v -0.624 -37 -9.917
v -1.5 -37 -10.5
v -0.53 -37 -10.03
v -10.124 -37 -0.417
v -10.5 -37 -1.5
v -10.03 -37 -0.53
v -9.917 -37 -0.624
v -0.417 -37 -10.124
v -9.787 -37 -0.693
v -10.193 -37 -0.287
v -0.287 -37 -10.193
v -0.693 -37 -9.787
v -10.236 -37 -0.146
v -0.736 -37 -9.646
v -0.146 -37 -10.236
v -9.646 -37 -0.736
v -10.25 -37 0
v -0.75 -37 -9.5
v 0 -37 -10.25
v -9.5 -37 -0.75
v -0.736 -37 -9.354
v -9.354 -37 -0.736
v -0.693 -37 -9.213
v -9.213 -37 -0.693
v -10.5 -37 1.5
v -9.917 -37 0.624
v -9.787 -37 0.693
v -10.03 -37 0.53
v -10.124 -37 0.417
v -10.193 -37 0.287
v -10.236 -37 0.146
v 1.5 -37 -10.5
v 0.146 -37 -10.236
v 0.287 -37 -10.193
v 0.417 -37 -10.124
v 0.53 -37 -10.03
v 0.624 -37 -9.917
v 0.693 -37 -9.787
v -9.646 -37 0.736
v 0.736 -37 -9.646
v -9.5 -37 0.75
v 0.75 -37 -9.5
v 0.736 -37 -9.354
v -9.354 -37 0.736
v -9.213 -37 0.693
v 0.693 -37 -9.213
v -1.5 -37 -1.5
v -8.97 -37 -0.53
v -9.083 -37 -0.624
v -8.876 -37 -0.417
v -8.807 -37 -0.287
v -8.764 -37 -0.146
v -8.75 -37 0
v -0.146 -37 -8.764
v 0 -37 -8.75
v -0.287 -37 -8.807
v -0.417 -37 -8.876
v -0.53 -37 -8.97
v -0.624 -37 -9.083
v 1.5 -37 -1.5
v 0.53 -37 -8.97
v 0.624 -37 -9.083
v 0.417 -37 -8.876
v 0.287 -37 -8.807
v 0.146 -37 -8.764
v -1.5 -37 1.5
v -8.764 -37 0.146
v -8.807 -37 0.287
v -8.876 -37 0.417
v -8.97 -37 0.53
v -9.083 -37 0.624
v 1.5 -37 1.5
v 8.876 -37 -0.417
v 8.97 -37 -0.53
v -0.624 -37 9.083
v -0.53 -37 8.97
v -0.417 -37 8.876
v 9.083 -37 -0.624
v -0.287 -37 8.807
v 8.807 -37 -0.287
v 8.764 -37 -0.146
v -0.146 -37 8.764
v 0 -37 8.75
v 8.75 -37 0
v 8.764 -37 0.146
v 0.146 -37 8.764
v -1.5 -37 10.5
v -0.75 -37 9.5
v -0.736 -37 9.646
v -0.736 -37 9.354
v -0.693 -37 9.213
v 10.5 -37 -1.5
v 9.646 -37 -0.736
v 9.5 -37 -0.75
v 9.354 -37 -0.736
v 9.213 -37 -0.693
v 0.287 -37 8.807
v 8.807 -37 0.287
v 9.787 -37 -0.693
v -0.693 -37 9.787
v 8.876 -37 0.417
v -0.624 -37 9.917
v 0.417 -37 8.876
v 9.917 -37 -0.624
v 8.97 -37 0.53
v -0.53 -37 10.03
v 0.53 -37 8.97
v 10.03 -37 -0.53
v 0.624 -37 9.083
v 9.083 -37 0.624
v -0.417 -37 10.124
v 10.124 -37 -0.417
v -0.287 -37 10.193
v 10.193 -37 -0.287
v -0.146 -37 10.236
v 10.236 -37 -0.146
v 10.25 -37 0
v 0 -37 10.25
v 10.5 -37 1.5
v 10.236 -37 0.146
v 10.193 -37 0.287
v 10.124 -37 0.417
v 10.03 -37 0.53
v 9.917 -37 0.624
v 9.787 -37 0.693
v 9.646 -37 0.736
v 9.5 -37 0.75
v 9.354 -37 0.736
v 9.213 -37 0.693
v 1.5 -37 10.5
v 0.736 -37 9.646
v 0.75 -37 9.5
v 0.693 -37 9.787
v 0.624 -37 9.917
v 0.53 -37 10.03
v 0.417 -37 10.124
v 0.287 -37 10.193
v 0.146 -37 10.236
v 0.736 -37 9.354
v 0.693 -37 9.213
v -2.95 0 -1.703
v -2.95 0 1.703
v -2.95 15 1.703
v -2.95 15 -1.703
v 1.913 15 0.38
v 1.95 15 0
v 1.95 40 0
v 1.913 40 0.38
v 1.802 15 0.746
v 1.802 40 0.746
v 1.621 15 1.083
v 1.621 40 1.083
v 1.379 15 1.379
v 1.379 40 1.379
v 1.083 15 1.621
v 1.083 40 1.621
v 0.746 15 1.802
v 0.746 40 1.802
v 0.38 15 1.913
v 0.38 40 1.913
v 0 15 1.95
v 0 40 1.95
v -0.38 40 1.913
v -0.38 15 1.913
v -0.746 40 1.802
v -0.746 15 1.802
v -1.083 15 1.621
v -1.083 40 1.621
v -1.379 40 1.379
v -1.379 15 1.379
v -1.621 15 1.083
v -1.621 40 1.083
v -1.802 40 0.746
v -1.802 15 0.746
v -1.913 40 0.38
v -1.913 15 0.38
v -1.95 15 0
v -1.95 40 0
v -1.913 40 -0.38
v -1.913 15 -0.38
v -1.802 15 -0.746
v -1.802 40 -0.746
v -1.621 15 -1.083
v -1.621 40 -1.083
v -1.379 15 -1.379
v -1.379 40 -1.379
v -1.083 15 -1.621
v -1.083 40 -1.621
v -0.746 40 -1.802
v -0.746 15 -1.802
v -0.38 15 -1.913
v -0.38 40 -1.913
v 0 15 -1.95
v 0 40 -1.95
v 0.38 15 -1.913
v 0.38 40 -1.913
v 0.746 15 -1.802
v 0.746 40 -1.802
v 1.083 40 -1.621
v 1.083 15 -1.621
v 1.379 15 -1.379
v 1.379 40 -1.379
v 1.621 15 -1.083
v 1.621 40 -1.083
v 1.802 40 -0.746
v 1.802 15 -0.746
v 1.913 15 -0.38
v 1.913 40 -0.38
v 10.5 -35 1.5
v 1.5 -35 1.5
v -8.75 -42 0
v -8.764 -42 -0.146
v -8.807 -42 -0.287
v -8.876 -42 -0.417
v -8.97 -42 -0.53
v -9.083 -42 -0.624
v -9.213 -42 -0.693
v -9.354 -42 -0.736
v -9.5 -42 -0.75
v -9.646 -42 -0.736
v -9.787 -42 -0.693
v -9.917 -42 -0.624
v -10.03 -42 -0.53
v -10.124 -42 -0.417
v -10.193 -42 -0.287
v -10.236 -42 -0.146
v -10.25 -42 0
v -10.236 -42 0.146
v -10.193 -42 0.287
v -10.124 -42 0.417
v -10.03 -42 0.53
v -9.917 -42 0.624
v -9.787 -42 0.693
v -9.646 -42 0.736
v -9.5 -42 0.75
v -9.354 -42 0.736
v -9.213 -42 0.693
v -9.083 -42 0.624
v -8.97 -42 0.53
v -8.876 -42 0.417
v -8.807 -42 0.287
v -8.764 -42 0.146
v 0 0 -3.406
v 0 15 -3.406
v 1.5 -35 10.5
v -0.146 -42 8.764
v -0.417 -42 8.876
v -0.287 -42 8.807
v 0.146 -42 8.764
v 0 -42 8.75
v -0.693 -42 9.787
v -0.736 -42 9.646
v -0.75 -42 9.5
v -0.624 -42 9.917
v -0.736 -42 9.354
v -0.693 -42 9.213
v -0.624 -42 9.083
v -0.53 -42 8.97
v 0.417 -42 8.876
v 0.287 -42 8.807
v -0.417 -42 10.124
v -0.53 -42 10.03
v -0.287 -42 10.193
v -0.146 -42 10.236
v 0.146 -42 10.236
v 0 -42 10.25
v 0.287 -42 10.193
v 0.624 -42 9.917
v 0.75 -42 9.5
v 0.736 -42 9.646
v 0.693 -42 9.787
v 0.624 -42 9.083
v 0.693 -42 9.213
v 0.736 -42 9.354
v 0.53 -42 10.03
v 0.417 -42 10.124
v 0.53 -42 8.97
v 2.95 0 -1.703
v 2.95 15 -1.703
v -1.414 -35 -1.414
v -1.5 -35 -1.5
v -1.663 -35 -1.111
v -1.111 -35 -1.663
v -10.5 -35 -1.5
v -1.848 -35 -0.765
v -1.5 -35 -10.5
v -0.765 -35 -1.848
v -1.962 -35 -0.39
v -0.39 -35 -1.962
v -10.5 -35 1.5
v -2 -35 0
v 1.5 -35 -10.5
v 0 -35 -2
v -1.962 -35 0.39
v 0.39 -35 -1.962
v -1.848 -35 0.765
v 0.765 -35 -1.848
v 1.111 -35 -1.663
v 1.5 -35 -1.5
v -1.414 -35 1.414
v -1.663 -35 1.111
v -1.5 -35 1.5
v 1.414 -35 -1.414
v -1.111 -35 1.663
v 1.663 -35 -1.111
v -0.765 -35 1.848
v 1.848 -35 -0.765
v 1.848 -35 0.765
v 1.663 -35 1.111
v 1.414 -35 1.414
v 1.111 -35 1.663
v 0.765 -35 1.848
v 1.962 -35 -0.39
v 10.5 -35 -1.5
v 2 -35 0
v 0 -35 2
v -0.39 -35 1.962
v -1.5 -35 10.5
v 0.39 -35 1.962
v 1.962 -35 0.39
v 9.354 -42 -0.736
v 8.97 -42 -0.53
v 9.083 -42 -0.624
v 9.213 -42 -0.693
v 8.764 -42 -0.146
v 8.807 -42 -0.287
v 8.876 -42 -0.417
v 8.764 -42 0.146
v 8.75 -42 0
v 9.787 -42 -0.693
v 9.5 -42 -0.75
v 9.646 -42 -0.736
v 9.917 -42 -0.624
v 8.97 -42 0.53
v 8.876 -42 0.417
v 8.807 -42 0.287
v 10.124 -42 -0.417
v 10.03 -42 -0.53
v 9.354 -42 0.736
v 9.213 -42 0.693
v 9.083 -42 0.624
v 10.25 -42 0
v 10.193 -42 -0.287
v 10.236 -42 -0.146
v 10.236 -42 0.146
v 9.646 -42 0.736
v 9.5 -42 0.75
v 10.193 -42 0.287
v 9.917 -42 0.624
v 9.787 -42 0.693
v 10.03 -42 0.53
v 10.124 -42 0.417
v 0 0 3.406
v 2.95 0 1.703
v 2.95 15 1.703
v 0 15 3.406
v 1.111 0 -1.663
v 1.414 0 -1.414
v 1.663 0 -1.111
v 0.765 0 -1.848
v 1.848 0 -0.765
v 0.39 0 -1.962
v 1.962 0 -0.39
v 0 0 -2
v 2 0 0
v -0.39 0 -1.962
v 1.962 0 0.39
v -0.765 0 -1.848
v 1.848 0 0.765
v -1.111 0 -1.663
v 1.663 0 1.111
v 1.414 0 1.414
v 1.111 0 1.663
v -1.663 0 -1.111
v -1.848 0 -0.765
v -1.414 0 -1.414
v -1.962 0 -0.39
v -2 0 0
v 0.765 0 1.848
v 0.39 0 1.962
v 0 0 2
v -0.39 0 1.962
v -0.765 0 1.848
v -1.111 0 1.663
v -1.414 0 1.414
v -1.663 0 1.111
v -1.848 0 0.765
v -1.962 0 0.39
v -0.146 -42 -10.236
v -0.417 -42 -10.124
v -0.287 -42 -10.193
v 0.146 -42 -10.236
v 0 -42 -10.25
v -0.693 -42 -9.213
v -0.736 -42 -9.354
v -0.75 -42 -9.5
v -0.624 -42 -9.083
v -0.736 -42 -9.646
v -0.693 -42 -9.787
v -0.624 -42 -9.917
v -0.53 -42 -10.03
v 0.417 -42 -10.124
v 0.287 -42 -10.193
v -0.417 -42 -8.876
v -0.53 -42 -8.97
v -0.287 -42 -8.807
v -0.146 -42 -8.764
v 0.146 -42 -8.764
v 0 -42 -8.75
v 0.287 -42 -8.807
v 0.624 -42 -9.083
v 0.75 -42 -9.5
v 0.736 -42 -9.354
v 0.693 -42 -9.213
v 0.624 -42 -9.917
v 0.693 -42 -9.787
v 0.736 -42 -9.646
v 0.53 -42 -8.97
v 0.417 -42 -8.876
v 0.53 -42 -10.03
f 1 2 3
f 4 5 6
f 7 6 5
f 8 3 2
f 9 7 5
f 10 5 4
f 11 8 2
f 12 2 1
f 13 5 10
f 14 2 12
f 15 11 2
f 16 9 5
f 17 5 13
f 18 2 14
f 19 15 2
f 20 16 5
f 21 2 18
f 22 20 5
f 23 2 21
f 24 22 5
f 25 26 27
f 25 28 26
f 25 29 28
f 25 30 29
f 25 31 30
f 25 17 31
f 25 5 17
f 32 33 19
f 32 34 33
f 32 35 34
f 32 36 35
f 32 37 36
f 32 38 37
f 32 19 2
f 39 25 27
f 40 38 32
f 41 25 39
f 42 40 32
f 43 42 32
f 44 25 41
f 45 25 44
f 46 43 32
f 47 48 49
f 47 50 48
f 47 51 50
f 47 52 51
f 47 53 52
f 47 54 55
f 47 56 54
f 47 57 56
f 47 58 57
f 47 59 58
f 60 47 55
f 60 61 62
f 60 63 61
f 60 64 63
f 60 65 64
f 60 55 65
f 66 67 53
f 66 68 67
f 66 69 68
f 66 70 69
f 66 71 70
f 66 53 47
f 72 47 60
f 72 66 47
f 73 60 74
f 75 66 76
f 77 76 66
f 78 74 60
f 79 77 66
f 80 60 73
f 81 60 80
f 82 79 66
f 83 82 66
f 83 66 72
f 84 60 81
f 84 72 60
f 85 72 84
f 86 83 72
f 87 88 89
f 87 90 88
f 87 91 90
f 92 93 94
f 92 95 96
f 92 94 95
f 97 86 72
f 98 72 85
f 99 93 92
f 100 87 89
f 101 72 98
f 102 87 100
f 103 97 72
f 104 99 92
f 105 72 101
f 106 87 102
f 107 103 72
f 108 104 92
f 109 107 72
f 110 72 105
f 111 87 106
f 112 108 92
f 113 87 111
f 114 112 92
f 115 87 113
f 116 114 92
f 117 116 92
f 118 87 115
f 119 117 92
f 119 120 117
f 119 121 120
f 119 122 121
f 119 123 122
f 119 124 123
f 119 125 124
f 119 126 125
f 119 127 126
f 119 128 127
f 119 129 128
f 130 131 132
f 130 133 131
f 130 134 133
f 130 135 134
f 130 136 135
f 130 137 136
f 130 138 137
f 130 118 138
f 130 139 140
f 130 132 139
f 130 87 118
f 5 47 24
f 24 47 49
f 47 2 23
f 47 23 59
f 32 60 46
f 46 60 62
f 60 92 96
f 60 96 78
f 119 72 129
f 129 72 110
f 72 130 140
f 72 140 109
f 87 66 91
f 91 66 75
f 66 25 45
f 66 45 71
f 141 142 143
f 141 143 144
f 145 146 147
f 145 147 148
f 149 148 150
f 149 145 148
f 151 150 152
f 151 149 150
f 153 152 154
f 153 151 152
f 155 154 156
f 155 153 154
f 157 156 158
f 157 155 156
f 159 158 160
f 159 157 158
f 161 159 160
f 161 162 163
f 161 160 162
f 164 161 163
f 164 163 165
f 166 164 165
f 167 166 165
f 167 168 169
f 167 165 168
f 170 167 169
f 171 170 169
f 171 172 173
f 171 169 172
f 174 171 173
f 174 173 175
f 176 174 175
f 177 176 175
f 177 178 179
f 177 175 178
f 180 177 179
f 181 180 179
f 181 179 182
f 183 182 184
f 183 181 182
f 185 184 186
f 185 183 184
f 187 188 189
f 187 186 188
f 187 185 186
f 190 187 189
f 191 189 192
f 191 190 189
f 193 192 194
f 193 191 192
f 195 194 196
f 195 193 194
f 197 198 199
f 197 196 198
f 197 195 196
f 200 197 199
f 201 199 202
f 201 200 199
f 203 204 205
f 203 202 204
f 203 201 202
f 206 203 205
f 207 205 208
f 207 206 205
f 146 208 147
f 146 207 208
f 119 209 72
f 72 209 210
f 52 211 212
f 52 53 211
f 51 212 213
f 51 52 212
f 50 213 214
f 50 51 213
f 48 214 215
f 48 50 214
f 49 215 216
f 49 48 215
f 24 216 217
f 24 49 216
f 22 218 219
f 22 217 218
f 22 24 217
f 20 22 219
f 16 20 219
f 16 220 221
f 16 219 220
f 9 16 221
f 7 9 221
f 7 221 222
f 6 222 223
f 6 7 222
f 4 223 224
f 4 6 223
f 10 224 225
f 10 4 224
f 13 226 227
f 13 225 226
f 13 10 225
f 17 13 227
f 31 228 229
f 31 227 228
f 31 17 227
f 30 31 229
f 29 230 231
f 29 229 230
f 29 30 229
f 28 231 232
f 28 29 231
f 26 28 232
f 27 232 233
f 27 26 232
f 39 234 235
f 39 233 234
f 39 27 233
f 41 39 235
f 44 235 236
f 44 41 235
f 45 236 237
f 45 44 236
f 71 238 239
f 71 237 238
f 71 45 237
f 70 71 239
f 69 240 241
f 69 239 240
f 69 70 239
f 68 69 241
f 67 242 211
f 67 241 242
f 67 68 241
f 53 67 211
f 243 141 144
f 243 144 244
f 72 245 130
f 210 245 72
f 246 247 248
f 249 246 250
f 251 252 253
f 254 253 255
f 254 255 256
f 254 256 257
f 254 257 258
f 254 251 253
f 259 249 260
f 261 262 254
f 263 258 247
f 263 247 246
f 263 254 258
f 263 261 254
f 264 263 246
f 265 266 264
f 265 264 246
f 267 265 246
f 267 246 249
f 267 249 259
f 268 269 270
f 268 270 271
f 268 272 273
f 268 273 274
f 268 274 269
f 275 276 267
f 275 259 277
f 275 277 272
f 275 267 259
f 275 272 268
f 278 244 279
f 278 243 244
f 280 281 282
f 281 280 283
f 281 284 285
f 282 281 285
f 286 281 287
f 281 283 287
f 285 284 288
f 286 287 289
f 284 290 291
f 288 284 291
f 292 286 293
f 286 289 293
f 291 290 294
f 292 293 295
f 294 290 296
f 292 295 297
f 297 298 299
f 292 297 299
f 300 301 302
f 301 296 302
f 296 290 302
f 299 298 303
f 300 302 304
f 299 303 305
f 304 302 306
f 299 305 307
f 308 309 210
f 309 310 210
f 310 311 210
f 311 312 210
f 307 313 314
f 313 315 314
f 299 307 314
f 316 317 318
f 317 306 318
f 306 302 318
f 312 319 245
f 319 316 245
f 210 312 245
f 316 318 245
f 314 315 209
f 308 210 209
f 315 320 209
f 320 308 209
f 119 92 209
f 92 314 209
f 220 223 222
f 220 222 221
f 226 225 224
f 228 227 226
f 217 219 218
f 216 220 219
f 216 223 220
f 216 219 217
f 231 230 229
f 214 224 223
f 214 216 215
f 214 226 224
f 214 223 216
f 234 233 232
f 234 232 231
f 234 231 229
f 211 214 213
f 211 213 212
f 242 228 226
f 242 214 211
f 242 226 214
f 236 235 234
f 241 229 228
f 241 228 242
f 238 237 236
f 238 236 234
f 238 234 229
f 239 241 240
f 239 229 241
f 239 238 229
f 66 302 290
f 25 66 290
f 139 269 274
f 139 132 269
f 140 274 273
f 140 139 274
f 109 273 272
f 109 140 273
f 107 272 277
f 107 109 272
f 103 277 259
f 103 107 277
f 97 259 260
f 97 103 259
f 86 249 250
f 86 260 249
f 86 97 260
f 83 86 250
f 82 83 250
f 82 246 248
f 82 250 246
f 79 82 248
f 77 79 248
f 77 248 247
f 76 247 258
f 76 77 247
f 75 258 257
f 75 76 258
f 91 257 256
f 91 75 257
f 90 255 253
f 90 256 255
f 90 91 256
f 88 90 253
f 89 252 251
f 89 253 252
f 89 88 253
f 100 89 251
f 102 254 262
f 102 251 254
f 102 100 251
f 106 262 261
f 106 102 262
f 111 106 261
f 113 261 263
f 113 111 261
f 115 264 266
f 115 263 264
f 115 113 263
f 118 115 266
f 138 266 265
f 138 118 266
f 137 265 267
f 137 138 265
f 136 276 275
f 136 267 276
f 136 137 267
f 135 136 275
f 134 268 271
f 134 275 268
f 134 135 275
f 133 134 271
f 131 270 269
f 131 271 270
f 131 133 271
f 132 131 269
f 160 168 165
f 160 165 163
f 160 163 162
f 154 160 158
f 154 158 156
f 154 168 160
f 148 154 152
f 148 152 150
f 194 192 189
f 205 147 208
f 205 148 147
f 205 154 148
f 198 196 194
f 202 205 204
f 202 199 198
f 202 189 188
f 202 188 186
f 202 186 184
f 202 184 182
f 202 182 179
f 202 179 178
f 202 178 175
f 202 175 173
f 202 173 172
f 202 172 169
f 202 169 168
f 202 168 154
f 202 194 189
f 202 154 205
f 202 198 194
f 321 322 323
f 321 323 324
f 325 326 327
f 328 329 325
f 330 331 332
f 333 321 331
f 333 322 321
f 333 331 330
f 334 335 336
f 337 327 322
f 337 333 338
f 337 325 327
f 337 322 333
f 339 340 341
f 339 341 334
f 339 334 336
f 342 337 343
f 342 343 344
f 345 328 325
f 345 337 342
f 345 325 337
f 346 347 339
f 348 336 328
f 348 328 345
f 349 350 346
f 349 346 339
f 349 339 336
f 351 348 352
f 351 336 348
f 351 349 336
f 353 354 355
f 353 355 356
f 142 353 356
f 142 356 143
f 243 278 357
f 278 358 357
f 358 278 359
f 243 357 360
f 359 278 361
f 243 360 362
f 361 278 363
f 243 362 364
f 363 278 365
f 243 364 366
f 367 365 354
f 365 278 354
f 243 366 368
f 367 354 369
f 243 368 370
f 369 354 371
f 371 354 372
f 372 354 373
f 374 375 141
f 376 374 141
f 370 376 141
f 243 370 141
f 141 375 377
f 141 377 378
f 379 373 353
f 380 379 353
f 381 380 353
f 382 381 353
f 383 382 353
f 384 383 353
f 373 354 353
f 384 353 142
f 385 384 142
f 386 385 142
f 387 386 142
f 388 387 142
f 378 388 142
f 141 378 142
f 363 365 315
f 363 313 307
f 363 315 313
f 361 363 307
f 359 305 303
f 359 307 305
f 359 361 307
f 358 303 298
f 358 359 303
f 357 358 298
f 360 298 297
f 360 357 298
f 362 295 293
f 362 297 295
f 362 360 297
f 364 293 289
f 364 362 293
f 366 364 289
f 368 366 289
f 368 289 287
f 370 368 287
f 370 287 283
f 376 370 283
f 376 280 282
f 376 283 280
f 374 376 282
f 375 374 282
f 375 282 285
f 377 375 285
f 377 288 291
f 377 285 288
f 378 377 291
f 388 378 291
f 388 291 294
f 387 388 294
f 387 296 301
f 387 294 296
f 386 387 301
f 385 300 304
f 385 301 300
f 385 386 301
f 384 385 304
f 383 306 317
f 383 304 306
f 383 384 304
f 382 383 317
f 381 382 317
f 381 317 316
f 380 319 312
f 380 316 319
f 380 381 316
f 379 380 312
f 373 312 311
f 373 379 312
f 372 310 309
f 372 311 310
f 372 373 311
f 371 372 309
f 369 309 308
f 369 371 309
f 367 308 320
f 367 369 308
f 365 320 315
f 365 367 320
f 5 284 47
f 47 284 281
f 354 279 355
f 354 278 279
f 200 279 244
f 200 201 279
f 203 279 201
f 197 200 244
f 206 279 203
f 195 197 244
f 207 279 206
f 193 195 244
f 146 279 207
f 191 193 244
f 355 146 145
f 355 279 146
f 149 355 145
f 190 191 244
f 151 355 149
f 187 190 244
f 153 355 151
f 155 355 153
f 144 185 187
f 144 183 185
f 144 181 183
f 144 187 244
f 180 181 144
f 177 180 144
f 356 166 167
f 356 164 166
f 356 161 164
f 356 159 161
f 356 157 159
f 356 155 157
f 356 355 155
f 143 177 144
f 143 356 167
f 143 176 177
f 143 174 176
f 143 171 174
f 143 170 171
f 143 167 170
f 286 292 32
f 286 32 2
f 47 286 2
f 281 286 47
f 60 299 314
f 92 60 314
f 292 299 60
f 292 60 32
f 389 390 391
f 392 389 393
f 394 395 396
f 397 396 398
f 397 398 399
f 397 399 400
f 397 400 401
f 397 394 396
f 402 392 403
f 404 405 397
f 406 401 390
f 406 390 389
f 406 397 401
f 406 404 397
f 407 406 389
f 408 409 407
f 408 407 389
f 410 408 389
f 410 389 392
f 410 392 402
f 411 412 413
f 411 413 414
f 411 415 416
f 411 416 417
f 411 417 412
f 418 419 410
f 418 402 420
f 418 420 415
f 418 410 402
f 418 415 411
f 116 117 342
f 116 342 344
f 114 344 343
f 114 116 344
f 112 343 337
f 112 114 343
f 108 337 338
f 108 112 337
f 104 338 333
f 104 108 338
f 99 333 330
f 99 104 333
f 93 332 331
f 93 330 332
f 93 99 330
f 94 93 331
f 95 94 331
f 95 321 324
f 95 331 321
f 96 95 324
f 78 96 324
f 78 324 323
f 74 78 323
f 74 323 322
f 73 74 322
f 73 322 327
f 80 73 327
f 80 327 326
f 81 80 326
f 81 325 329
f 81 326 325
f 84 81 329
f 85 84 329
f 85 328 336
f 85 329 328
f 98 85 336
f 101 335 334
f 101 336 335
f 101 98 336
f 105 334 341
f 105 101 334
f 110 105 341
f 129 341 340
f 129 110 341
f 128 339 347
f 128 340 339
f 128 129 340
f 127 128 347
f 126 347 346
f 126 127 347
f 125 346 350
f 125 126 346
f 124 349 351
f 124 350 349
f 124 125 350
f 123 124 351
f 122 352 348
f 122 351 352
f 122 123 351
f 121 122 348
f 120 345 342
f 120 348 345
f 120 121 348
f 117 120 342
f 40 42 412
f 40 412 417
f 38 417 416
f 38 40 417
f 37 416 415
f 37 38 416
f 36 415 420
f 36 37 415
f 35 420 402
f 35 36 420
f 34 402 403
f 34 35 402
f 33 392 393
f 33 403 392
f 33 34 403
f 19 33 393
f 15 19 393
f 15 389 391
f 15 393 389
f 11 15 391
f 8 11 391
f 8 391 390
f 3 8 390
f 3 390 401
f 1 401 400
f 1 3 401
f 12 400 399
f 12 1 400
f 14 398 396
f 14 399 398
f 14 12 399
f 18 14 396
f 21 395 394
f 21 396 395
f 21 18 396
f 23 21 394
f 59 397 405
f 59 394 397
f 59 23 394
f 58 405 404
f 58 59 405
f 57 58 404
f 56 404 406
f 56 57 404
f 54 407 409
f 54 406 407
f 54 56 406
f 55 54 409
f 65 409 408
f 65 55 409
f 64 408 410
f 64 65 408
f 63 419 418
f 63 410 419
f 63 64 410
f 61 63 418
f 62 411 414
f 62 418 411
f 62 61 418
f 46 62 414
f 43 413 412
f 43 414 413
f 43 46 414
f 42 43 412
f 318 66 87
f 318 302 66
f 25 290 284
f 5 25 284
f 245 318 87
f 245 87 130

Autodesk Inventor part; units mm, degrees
ref_plane "YZ Plane" through (0, 0, 0) normal (1, 0, 0) x (0, 1, 0)
ref_plane "XZ Plane" through (0, 0, 0) normal (0, 1, 0) x (-1, 0, 0)
ref_plane "XY Plane" through (0, 0, 0) normal (0, 0, 1) x (1, 0, 0)
sketch "草图1" plane through (0, 0, 0) normal (0, 1, 0) x (-1, 0, 0)
  line L0 (2.95, -1.7032) -> (0, -3.4064)
  line L1 (0, -3.4064) -> (-2.95, -1.7032)
  line L2 (-2.95, -1.7032) -> (-2.95, 1.7032)
  line L3 (-2.95, 1.7032) -> (0, 3.4064)
  line L4 (0, 3.4064) -> (2.95, 1.7032)
  line L5 (2.95, 1.7032) -> (2.95, -1.7032)
  point P0 (0, 0)
  point P1 (0, 0)
  point P2 (2.95, 0)
extrude "拉伸1" add sketch "草图1" along normal blind 15
sketch "草图2" plane through (0, 15, 0) normal (0, 1, 0) x (1, 0, 0)
  circle A0 centre (0, 0) radius 1.95
  dimension "d3" = 3.9
extrude "拉伸2" add sketch "草图2" along normal blind 25
thread "螺纹1" size "M4x0.7" class "6g" standard "ANSI Metric M Profile" length 5
sketch "草图6" plane through (0, 0, 0) normal (0, -1, 0) x (1, 0, 0)
  circle A0 centre (0, 0) radius 2
  dimension "d22" = 4
extrude "拉伸6" add sketch "草图6" along normal blind 35
sketch "草图7" plane through (0, -35, 0) normal (0, -1, 0) x (1, 0, 0)
  line L0 (10.5, -1.5) -> (10.5, 1.5)
  line L1 (-10.5, 1.5) -> (-10.5, -1.5)
  line L2 (-10.5, -1.5) -> (10.5, 1.5) construction
  line L3 (10.5, -1.5) -> (-10.5, 1.5) construction
  line L4 (-1.5, 10.5) -> (1.5, 10.5)
  line L5 (1.5, -10.5) -> (-1.5, -10.5)
  line L6 (-1.5, 10.5) -> (1.5, -10.5) construction
  line L7 (1.5, 10.5) -> (-1.5, -10.5) construction
  line L8 (-1.5, 1.5) -> (-10.5, 1.5)
  line L9 (10.5, 1.5) -> (1.5, 1.5)
  line L10 (1.5, 10.5) -> (1.5, 1.5)
  line L11 (1.5, -1.5) -> (1.5, -10.5)
  line L12 (1.5, -1.5) -> (10.5, -1.5)
  line L13 (-10.5, -1.5) -> (-1.5, -1.5)
  line L14 (-1.5, -10.5) -> (-1.5, -1.5)
  line L15 (-1.5, 1.5) -> (-1.5, 10.5)
  point P0 (0, 0)
  dimension "d26" = 21
extrude "拉伸7" add sketch "草图7" along normal blind 2
sketch "草图8" plane through (0, -37, 0) normal (0, -1, 0) x (1, 0, 0)
  circle A0 centre (0, 0) radius 9.5 construction
  circle A1 centre (0, 9.5) radius 0.75
  circle A2 centre (-9.5, 0) radius 0.75
  circle A3 centre (0, -9.5) radius 0.75
  circle A4 centre (9.5, 0) radius 0.75
  dimension "d29" = 19
  dimension "d30" = 1.5
  dimension "d31" = 1.5
  dimension "d32" = 1.5
  dimension "d33" = 1.5
extrude "拉伸8" add sketch "草图8" along normal blind 5
properties part number "杆件"
